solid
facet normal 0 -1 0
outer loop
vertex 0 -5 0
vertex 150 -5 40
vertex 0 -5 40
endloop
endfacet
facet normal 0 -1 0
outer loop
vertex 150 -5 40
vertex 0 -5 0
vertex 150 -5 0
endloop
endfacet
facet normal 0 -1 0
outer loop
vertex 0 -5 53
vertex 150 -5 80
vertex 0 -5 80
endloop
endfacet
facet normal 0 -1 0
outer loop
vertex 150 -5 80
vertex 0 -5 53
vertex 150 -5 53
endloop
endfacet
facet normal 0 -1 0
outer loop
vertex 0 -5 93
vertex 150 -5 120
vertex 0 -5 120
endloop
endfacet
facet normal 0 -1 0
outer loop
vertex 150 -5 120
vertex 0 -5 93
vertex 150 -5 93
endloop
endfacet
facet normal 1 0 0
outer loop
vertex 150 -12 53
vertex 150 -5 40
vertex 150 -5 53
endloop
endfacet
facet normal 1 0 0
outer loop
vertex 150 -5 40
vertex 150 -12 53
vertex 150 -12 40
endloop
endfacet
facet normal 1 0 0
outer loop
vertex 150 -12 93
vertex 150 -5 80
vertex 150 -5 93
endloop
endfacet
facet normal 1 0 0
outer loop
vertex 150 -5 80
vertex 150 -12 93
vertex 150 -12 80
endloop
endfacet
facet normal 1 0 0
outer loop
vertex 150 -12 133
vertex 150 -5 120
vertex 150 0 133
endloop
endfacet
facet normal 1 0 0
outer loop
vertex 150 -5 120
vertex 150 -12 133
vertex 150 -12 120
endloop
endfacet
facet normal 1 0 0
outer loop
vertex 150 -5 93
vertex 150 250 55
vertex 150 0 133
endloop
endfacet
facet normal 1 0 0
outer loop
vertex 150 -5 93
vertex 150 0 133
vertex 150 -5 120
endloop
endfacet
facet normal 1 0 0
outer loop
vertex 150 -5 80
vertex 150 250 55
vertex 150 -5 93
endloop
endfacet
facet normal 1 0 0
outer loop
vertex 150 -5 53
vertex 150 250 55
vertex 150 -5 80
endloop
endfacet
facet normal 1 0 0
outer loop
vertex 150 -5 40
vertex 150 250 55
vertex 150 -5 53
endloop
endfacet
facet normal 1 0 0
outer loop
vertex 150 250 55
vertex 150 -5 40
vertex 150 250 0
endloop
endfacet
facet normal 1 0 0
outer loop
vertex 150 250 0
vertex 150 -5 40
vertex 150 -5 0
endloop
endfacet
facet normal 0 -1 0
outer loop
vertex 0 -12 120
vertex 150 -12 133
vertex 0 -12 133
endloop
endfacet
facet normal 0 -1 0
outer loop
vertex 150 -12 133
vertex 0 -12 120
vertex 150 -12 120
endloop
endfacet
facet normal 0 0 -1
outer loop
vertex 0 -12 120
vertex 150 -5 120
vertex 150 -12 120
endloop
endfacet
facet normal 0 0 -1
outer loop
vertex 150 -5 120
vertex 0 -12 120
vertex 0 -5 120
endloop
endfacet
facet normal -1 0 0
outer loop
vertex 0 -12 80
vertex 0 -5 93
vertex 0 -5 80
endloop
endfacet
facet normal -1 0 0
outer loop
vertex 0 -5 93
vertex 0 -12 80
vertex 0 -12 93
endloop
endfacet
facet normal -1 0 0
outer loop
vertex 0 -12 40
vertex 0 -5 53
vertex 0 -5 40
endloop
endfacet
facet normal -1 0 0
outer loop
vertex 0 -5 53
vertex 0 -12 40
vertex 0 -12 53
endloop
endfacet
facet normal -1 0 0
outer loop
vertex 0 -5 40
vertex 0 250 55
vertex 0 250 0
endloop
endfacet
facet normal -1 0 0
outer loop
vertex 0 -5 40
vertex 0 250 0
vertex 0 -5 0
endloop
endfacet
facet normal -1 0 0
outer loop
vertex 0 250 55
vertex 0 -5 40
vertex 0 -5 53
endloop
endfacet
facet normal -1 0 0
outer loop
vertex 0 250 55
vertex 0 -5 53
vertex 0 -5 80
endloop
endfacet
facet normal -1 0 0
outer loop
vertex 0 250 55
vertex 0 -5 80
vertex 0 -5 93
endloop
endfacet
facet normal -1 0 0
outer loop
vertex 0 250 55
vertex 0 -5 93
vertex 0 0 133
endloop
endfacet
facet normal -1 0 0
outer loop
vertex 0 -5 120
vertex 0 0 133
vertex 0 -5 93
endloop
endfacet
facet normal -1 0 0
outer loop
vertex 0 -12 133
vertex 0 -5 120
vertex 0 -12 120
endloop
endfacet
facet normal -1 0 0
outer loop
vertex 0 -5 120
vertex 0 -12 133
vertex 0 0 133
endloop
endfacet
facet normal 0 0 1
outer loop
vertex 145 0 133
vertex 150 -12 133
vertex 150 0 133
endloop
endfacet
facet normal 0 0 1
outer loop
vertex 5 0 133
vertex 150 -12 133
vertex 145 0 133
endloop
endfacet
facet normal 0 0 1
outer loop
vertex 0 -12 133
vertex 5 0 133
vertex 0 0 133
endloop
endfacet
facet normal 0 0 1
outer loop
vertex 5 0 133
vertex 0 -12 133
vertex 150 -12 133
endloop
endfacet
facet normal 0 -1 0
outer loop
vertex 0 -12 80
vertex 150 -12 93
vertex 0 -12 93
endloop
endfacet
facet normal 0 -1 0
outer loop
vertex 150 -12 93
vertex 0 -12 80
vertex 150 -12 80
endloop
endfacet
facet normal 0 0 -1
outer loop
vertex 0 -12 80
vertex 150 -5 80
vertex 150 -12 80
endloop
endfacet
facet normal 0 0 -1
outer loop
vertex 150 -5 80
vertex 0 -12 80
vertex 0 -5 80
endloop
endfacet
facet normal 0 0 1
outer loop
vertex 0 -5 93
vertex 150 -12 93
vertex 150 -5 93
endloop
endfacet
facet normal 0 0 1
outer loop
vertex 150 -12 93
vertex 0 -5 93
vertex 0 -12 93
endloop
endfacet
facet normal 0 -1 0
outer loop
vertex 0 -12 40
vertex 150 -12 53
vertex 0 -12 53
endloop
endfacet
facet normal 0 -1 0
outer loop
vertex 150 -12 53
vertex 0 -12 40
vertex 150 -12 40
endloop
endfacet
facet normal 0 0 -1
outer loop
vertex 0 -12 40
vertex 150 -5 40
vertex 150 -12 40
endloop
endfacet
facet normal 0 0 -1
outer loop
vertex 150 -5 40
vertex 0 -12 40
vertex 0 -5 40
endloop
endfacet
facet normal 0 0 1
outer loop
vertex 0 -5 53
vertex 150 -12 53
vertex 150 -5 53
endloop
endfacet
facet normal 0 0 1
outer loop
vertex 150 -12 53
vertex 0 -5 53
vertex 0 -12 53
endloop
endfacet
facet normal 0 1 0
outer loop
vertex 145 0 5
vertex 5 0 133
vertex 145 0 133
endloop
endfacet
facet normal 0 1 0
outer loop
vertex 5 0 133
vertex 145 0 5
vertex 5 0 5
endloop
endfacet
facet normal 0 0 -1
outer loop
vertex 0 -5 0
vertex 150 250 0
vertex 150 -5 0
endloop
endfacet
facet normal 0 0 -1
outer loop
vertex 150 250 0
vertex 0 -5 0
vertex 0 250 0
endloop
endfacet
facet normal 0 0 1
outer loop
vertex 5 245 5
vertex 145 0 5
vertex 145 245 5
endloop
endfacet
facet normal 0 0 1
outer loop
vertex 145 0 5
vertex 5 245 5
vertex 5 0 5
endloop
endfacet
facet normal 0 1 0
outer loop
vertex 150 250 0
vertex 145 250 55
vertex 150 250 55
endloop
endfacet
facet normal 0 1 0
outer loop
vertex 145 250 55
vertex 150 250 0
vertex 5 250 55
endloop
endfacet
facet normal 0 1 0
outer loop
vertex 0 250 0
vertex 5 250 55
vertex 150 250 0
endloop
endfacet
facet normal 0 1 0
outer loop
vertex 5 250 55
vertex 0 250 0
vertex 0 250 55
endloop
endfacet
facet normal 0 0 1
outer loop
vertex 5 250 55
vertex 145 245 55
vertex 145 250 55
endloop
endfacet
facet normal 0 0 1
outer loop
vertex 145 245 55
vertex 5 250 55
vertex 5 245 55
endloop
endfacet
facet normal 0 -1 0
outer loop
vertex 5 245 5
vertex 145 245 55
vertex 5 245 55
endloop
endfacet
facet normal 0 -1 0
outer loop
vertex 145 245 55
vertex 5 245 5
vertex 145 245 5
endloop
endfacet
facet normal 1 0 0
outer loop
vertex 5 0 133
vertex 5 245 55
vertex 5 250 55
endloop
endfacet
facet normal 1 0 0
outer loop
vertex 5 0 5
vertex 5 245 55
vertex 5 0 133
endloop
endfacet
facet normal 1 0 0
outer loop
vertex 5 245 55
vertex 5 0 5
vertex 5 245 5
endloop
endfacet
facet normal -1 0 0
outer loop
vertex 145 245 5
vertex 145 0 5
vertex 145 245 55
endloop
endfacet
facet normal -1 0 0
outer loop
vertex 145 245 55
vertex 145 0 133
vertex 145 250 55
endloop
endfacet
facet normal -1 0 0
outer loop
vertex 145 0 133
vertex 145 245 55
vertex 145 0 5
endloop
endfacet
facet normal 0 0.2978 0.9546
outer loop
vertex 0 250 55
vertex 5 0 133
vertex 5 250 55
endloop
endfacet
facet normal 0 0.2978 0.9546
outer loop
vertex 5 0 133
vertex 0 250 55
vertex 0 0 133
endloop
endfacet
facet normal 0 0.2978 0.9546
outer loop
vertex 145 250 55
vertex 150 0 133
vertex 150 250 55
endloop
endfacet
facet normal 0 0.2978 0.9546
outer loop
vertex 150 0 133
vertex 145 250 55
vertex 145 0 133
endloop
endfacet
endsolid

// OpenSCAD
// file: ../Library/GeneralBracket.scad
HOLE_HEIGHT = 13;
HOLE_THICKNESS = 7;
WOOD_SLAB_HEIGHT = 27;

function BracketHeight(number_of_bracket) = ((HOLE_HEIGHT + WOOD_SLAB_HEIGHT)*(number_of_bracket))+ HOLE_HEIGHT;

module GeneralBracket(number_of_bracket, width, thickness)
{
    height = BracketHeight(number_of_bracket);
    
    linear_extrude(thickness)
    square([width,height]);
    
    for(i = [0:number_of_bracket-1])
        translate([0,(HOLE_HEIGHT + WOOD_SLAB_HEIGHT)*i, thickness])
        linear_extrude(HOLE_THICKNESS)
        square([width, HOLE_HEIGHT]);
}
// main file
include <../Library/GeneralBracket.scad>

GENERAL_THICKNESS = 5;
GENERAL_WIDTH = 150;
GENERAL_HEIGHT = 250;
BASKET_Z = 50;
NUMBER_OF_BRACKET = 3;

union()
{
    translate([GENERAL_WIDTH, 0, BracketHeight(NUMBER_OF_BRACKET)])
    rotate([90,180,0])
    GeneralBracket(NUMBER_OF_BRACKET, GENERAL_WIDTH, GENERAL_THICKNESS);
    linear_extrude(GENERAL_THICKNESS)
    square([GENERAL_WIDTH, GENERAL_HEIGHT]);
    translate([0, GENERAL_HEIGHT, GENERAL_THICKNESS])
    rotate([90, 0, 0])
    linear_extrude(GENERAL_THICKNESS)
    square([GENERAL_WIDTH, BASKET_Z]);
    translate([0, 0, GENERAL_THICKNESS])
    rotate([90, 0, 90])
    linear_extrude(GENERAL_THICKNESS)
    square([GENERAL_HEIGHT, BASKET_Z]);
    translate([GENERAL_WIDTH-GENERAL_THICKNESS, 0, GENERAL_THICKNESS])
    rotate([90, 0, 90])
    linear_extrude(GENERAL_THICKNESS)
    square([GENERAL_HEIGHT, BASKET_Z]);
    translate([0,0,BASKET_Z+GENERAL_THICKNESS])
    rotate([90, 0, 90])
    linear_extrude(GENERAL_THICKNESS)
    polygon([[0,0],[0,BracketHeight(NUMBER_OF_BRACKET)-BASKET_Z-GENERAL_THICKNESS],[GENERAL_HEIGHT,0]]);
    translate([GENERAL_WIDTH-GENERAL_THICKNESS,0,BASKET_Z+GENERAL_THICKNESS])
    rotate([90, 0, 90])
    linear_extrude(GENERAL_THICKNESS)
    polygon([[0,0],[0,BracketHeight(NUMBER_OF_BRACKET)-BASKET_Z-GENERAL_THICKNESS],[GENERAL_HEIGHT,0]]);
}
